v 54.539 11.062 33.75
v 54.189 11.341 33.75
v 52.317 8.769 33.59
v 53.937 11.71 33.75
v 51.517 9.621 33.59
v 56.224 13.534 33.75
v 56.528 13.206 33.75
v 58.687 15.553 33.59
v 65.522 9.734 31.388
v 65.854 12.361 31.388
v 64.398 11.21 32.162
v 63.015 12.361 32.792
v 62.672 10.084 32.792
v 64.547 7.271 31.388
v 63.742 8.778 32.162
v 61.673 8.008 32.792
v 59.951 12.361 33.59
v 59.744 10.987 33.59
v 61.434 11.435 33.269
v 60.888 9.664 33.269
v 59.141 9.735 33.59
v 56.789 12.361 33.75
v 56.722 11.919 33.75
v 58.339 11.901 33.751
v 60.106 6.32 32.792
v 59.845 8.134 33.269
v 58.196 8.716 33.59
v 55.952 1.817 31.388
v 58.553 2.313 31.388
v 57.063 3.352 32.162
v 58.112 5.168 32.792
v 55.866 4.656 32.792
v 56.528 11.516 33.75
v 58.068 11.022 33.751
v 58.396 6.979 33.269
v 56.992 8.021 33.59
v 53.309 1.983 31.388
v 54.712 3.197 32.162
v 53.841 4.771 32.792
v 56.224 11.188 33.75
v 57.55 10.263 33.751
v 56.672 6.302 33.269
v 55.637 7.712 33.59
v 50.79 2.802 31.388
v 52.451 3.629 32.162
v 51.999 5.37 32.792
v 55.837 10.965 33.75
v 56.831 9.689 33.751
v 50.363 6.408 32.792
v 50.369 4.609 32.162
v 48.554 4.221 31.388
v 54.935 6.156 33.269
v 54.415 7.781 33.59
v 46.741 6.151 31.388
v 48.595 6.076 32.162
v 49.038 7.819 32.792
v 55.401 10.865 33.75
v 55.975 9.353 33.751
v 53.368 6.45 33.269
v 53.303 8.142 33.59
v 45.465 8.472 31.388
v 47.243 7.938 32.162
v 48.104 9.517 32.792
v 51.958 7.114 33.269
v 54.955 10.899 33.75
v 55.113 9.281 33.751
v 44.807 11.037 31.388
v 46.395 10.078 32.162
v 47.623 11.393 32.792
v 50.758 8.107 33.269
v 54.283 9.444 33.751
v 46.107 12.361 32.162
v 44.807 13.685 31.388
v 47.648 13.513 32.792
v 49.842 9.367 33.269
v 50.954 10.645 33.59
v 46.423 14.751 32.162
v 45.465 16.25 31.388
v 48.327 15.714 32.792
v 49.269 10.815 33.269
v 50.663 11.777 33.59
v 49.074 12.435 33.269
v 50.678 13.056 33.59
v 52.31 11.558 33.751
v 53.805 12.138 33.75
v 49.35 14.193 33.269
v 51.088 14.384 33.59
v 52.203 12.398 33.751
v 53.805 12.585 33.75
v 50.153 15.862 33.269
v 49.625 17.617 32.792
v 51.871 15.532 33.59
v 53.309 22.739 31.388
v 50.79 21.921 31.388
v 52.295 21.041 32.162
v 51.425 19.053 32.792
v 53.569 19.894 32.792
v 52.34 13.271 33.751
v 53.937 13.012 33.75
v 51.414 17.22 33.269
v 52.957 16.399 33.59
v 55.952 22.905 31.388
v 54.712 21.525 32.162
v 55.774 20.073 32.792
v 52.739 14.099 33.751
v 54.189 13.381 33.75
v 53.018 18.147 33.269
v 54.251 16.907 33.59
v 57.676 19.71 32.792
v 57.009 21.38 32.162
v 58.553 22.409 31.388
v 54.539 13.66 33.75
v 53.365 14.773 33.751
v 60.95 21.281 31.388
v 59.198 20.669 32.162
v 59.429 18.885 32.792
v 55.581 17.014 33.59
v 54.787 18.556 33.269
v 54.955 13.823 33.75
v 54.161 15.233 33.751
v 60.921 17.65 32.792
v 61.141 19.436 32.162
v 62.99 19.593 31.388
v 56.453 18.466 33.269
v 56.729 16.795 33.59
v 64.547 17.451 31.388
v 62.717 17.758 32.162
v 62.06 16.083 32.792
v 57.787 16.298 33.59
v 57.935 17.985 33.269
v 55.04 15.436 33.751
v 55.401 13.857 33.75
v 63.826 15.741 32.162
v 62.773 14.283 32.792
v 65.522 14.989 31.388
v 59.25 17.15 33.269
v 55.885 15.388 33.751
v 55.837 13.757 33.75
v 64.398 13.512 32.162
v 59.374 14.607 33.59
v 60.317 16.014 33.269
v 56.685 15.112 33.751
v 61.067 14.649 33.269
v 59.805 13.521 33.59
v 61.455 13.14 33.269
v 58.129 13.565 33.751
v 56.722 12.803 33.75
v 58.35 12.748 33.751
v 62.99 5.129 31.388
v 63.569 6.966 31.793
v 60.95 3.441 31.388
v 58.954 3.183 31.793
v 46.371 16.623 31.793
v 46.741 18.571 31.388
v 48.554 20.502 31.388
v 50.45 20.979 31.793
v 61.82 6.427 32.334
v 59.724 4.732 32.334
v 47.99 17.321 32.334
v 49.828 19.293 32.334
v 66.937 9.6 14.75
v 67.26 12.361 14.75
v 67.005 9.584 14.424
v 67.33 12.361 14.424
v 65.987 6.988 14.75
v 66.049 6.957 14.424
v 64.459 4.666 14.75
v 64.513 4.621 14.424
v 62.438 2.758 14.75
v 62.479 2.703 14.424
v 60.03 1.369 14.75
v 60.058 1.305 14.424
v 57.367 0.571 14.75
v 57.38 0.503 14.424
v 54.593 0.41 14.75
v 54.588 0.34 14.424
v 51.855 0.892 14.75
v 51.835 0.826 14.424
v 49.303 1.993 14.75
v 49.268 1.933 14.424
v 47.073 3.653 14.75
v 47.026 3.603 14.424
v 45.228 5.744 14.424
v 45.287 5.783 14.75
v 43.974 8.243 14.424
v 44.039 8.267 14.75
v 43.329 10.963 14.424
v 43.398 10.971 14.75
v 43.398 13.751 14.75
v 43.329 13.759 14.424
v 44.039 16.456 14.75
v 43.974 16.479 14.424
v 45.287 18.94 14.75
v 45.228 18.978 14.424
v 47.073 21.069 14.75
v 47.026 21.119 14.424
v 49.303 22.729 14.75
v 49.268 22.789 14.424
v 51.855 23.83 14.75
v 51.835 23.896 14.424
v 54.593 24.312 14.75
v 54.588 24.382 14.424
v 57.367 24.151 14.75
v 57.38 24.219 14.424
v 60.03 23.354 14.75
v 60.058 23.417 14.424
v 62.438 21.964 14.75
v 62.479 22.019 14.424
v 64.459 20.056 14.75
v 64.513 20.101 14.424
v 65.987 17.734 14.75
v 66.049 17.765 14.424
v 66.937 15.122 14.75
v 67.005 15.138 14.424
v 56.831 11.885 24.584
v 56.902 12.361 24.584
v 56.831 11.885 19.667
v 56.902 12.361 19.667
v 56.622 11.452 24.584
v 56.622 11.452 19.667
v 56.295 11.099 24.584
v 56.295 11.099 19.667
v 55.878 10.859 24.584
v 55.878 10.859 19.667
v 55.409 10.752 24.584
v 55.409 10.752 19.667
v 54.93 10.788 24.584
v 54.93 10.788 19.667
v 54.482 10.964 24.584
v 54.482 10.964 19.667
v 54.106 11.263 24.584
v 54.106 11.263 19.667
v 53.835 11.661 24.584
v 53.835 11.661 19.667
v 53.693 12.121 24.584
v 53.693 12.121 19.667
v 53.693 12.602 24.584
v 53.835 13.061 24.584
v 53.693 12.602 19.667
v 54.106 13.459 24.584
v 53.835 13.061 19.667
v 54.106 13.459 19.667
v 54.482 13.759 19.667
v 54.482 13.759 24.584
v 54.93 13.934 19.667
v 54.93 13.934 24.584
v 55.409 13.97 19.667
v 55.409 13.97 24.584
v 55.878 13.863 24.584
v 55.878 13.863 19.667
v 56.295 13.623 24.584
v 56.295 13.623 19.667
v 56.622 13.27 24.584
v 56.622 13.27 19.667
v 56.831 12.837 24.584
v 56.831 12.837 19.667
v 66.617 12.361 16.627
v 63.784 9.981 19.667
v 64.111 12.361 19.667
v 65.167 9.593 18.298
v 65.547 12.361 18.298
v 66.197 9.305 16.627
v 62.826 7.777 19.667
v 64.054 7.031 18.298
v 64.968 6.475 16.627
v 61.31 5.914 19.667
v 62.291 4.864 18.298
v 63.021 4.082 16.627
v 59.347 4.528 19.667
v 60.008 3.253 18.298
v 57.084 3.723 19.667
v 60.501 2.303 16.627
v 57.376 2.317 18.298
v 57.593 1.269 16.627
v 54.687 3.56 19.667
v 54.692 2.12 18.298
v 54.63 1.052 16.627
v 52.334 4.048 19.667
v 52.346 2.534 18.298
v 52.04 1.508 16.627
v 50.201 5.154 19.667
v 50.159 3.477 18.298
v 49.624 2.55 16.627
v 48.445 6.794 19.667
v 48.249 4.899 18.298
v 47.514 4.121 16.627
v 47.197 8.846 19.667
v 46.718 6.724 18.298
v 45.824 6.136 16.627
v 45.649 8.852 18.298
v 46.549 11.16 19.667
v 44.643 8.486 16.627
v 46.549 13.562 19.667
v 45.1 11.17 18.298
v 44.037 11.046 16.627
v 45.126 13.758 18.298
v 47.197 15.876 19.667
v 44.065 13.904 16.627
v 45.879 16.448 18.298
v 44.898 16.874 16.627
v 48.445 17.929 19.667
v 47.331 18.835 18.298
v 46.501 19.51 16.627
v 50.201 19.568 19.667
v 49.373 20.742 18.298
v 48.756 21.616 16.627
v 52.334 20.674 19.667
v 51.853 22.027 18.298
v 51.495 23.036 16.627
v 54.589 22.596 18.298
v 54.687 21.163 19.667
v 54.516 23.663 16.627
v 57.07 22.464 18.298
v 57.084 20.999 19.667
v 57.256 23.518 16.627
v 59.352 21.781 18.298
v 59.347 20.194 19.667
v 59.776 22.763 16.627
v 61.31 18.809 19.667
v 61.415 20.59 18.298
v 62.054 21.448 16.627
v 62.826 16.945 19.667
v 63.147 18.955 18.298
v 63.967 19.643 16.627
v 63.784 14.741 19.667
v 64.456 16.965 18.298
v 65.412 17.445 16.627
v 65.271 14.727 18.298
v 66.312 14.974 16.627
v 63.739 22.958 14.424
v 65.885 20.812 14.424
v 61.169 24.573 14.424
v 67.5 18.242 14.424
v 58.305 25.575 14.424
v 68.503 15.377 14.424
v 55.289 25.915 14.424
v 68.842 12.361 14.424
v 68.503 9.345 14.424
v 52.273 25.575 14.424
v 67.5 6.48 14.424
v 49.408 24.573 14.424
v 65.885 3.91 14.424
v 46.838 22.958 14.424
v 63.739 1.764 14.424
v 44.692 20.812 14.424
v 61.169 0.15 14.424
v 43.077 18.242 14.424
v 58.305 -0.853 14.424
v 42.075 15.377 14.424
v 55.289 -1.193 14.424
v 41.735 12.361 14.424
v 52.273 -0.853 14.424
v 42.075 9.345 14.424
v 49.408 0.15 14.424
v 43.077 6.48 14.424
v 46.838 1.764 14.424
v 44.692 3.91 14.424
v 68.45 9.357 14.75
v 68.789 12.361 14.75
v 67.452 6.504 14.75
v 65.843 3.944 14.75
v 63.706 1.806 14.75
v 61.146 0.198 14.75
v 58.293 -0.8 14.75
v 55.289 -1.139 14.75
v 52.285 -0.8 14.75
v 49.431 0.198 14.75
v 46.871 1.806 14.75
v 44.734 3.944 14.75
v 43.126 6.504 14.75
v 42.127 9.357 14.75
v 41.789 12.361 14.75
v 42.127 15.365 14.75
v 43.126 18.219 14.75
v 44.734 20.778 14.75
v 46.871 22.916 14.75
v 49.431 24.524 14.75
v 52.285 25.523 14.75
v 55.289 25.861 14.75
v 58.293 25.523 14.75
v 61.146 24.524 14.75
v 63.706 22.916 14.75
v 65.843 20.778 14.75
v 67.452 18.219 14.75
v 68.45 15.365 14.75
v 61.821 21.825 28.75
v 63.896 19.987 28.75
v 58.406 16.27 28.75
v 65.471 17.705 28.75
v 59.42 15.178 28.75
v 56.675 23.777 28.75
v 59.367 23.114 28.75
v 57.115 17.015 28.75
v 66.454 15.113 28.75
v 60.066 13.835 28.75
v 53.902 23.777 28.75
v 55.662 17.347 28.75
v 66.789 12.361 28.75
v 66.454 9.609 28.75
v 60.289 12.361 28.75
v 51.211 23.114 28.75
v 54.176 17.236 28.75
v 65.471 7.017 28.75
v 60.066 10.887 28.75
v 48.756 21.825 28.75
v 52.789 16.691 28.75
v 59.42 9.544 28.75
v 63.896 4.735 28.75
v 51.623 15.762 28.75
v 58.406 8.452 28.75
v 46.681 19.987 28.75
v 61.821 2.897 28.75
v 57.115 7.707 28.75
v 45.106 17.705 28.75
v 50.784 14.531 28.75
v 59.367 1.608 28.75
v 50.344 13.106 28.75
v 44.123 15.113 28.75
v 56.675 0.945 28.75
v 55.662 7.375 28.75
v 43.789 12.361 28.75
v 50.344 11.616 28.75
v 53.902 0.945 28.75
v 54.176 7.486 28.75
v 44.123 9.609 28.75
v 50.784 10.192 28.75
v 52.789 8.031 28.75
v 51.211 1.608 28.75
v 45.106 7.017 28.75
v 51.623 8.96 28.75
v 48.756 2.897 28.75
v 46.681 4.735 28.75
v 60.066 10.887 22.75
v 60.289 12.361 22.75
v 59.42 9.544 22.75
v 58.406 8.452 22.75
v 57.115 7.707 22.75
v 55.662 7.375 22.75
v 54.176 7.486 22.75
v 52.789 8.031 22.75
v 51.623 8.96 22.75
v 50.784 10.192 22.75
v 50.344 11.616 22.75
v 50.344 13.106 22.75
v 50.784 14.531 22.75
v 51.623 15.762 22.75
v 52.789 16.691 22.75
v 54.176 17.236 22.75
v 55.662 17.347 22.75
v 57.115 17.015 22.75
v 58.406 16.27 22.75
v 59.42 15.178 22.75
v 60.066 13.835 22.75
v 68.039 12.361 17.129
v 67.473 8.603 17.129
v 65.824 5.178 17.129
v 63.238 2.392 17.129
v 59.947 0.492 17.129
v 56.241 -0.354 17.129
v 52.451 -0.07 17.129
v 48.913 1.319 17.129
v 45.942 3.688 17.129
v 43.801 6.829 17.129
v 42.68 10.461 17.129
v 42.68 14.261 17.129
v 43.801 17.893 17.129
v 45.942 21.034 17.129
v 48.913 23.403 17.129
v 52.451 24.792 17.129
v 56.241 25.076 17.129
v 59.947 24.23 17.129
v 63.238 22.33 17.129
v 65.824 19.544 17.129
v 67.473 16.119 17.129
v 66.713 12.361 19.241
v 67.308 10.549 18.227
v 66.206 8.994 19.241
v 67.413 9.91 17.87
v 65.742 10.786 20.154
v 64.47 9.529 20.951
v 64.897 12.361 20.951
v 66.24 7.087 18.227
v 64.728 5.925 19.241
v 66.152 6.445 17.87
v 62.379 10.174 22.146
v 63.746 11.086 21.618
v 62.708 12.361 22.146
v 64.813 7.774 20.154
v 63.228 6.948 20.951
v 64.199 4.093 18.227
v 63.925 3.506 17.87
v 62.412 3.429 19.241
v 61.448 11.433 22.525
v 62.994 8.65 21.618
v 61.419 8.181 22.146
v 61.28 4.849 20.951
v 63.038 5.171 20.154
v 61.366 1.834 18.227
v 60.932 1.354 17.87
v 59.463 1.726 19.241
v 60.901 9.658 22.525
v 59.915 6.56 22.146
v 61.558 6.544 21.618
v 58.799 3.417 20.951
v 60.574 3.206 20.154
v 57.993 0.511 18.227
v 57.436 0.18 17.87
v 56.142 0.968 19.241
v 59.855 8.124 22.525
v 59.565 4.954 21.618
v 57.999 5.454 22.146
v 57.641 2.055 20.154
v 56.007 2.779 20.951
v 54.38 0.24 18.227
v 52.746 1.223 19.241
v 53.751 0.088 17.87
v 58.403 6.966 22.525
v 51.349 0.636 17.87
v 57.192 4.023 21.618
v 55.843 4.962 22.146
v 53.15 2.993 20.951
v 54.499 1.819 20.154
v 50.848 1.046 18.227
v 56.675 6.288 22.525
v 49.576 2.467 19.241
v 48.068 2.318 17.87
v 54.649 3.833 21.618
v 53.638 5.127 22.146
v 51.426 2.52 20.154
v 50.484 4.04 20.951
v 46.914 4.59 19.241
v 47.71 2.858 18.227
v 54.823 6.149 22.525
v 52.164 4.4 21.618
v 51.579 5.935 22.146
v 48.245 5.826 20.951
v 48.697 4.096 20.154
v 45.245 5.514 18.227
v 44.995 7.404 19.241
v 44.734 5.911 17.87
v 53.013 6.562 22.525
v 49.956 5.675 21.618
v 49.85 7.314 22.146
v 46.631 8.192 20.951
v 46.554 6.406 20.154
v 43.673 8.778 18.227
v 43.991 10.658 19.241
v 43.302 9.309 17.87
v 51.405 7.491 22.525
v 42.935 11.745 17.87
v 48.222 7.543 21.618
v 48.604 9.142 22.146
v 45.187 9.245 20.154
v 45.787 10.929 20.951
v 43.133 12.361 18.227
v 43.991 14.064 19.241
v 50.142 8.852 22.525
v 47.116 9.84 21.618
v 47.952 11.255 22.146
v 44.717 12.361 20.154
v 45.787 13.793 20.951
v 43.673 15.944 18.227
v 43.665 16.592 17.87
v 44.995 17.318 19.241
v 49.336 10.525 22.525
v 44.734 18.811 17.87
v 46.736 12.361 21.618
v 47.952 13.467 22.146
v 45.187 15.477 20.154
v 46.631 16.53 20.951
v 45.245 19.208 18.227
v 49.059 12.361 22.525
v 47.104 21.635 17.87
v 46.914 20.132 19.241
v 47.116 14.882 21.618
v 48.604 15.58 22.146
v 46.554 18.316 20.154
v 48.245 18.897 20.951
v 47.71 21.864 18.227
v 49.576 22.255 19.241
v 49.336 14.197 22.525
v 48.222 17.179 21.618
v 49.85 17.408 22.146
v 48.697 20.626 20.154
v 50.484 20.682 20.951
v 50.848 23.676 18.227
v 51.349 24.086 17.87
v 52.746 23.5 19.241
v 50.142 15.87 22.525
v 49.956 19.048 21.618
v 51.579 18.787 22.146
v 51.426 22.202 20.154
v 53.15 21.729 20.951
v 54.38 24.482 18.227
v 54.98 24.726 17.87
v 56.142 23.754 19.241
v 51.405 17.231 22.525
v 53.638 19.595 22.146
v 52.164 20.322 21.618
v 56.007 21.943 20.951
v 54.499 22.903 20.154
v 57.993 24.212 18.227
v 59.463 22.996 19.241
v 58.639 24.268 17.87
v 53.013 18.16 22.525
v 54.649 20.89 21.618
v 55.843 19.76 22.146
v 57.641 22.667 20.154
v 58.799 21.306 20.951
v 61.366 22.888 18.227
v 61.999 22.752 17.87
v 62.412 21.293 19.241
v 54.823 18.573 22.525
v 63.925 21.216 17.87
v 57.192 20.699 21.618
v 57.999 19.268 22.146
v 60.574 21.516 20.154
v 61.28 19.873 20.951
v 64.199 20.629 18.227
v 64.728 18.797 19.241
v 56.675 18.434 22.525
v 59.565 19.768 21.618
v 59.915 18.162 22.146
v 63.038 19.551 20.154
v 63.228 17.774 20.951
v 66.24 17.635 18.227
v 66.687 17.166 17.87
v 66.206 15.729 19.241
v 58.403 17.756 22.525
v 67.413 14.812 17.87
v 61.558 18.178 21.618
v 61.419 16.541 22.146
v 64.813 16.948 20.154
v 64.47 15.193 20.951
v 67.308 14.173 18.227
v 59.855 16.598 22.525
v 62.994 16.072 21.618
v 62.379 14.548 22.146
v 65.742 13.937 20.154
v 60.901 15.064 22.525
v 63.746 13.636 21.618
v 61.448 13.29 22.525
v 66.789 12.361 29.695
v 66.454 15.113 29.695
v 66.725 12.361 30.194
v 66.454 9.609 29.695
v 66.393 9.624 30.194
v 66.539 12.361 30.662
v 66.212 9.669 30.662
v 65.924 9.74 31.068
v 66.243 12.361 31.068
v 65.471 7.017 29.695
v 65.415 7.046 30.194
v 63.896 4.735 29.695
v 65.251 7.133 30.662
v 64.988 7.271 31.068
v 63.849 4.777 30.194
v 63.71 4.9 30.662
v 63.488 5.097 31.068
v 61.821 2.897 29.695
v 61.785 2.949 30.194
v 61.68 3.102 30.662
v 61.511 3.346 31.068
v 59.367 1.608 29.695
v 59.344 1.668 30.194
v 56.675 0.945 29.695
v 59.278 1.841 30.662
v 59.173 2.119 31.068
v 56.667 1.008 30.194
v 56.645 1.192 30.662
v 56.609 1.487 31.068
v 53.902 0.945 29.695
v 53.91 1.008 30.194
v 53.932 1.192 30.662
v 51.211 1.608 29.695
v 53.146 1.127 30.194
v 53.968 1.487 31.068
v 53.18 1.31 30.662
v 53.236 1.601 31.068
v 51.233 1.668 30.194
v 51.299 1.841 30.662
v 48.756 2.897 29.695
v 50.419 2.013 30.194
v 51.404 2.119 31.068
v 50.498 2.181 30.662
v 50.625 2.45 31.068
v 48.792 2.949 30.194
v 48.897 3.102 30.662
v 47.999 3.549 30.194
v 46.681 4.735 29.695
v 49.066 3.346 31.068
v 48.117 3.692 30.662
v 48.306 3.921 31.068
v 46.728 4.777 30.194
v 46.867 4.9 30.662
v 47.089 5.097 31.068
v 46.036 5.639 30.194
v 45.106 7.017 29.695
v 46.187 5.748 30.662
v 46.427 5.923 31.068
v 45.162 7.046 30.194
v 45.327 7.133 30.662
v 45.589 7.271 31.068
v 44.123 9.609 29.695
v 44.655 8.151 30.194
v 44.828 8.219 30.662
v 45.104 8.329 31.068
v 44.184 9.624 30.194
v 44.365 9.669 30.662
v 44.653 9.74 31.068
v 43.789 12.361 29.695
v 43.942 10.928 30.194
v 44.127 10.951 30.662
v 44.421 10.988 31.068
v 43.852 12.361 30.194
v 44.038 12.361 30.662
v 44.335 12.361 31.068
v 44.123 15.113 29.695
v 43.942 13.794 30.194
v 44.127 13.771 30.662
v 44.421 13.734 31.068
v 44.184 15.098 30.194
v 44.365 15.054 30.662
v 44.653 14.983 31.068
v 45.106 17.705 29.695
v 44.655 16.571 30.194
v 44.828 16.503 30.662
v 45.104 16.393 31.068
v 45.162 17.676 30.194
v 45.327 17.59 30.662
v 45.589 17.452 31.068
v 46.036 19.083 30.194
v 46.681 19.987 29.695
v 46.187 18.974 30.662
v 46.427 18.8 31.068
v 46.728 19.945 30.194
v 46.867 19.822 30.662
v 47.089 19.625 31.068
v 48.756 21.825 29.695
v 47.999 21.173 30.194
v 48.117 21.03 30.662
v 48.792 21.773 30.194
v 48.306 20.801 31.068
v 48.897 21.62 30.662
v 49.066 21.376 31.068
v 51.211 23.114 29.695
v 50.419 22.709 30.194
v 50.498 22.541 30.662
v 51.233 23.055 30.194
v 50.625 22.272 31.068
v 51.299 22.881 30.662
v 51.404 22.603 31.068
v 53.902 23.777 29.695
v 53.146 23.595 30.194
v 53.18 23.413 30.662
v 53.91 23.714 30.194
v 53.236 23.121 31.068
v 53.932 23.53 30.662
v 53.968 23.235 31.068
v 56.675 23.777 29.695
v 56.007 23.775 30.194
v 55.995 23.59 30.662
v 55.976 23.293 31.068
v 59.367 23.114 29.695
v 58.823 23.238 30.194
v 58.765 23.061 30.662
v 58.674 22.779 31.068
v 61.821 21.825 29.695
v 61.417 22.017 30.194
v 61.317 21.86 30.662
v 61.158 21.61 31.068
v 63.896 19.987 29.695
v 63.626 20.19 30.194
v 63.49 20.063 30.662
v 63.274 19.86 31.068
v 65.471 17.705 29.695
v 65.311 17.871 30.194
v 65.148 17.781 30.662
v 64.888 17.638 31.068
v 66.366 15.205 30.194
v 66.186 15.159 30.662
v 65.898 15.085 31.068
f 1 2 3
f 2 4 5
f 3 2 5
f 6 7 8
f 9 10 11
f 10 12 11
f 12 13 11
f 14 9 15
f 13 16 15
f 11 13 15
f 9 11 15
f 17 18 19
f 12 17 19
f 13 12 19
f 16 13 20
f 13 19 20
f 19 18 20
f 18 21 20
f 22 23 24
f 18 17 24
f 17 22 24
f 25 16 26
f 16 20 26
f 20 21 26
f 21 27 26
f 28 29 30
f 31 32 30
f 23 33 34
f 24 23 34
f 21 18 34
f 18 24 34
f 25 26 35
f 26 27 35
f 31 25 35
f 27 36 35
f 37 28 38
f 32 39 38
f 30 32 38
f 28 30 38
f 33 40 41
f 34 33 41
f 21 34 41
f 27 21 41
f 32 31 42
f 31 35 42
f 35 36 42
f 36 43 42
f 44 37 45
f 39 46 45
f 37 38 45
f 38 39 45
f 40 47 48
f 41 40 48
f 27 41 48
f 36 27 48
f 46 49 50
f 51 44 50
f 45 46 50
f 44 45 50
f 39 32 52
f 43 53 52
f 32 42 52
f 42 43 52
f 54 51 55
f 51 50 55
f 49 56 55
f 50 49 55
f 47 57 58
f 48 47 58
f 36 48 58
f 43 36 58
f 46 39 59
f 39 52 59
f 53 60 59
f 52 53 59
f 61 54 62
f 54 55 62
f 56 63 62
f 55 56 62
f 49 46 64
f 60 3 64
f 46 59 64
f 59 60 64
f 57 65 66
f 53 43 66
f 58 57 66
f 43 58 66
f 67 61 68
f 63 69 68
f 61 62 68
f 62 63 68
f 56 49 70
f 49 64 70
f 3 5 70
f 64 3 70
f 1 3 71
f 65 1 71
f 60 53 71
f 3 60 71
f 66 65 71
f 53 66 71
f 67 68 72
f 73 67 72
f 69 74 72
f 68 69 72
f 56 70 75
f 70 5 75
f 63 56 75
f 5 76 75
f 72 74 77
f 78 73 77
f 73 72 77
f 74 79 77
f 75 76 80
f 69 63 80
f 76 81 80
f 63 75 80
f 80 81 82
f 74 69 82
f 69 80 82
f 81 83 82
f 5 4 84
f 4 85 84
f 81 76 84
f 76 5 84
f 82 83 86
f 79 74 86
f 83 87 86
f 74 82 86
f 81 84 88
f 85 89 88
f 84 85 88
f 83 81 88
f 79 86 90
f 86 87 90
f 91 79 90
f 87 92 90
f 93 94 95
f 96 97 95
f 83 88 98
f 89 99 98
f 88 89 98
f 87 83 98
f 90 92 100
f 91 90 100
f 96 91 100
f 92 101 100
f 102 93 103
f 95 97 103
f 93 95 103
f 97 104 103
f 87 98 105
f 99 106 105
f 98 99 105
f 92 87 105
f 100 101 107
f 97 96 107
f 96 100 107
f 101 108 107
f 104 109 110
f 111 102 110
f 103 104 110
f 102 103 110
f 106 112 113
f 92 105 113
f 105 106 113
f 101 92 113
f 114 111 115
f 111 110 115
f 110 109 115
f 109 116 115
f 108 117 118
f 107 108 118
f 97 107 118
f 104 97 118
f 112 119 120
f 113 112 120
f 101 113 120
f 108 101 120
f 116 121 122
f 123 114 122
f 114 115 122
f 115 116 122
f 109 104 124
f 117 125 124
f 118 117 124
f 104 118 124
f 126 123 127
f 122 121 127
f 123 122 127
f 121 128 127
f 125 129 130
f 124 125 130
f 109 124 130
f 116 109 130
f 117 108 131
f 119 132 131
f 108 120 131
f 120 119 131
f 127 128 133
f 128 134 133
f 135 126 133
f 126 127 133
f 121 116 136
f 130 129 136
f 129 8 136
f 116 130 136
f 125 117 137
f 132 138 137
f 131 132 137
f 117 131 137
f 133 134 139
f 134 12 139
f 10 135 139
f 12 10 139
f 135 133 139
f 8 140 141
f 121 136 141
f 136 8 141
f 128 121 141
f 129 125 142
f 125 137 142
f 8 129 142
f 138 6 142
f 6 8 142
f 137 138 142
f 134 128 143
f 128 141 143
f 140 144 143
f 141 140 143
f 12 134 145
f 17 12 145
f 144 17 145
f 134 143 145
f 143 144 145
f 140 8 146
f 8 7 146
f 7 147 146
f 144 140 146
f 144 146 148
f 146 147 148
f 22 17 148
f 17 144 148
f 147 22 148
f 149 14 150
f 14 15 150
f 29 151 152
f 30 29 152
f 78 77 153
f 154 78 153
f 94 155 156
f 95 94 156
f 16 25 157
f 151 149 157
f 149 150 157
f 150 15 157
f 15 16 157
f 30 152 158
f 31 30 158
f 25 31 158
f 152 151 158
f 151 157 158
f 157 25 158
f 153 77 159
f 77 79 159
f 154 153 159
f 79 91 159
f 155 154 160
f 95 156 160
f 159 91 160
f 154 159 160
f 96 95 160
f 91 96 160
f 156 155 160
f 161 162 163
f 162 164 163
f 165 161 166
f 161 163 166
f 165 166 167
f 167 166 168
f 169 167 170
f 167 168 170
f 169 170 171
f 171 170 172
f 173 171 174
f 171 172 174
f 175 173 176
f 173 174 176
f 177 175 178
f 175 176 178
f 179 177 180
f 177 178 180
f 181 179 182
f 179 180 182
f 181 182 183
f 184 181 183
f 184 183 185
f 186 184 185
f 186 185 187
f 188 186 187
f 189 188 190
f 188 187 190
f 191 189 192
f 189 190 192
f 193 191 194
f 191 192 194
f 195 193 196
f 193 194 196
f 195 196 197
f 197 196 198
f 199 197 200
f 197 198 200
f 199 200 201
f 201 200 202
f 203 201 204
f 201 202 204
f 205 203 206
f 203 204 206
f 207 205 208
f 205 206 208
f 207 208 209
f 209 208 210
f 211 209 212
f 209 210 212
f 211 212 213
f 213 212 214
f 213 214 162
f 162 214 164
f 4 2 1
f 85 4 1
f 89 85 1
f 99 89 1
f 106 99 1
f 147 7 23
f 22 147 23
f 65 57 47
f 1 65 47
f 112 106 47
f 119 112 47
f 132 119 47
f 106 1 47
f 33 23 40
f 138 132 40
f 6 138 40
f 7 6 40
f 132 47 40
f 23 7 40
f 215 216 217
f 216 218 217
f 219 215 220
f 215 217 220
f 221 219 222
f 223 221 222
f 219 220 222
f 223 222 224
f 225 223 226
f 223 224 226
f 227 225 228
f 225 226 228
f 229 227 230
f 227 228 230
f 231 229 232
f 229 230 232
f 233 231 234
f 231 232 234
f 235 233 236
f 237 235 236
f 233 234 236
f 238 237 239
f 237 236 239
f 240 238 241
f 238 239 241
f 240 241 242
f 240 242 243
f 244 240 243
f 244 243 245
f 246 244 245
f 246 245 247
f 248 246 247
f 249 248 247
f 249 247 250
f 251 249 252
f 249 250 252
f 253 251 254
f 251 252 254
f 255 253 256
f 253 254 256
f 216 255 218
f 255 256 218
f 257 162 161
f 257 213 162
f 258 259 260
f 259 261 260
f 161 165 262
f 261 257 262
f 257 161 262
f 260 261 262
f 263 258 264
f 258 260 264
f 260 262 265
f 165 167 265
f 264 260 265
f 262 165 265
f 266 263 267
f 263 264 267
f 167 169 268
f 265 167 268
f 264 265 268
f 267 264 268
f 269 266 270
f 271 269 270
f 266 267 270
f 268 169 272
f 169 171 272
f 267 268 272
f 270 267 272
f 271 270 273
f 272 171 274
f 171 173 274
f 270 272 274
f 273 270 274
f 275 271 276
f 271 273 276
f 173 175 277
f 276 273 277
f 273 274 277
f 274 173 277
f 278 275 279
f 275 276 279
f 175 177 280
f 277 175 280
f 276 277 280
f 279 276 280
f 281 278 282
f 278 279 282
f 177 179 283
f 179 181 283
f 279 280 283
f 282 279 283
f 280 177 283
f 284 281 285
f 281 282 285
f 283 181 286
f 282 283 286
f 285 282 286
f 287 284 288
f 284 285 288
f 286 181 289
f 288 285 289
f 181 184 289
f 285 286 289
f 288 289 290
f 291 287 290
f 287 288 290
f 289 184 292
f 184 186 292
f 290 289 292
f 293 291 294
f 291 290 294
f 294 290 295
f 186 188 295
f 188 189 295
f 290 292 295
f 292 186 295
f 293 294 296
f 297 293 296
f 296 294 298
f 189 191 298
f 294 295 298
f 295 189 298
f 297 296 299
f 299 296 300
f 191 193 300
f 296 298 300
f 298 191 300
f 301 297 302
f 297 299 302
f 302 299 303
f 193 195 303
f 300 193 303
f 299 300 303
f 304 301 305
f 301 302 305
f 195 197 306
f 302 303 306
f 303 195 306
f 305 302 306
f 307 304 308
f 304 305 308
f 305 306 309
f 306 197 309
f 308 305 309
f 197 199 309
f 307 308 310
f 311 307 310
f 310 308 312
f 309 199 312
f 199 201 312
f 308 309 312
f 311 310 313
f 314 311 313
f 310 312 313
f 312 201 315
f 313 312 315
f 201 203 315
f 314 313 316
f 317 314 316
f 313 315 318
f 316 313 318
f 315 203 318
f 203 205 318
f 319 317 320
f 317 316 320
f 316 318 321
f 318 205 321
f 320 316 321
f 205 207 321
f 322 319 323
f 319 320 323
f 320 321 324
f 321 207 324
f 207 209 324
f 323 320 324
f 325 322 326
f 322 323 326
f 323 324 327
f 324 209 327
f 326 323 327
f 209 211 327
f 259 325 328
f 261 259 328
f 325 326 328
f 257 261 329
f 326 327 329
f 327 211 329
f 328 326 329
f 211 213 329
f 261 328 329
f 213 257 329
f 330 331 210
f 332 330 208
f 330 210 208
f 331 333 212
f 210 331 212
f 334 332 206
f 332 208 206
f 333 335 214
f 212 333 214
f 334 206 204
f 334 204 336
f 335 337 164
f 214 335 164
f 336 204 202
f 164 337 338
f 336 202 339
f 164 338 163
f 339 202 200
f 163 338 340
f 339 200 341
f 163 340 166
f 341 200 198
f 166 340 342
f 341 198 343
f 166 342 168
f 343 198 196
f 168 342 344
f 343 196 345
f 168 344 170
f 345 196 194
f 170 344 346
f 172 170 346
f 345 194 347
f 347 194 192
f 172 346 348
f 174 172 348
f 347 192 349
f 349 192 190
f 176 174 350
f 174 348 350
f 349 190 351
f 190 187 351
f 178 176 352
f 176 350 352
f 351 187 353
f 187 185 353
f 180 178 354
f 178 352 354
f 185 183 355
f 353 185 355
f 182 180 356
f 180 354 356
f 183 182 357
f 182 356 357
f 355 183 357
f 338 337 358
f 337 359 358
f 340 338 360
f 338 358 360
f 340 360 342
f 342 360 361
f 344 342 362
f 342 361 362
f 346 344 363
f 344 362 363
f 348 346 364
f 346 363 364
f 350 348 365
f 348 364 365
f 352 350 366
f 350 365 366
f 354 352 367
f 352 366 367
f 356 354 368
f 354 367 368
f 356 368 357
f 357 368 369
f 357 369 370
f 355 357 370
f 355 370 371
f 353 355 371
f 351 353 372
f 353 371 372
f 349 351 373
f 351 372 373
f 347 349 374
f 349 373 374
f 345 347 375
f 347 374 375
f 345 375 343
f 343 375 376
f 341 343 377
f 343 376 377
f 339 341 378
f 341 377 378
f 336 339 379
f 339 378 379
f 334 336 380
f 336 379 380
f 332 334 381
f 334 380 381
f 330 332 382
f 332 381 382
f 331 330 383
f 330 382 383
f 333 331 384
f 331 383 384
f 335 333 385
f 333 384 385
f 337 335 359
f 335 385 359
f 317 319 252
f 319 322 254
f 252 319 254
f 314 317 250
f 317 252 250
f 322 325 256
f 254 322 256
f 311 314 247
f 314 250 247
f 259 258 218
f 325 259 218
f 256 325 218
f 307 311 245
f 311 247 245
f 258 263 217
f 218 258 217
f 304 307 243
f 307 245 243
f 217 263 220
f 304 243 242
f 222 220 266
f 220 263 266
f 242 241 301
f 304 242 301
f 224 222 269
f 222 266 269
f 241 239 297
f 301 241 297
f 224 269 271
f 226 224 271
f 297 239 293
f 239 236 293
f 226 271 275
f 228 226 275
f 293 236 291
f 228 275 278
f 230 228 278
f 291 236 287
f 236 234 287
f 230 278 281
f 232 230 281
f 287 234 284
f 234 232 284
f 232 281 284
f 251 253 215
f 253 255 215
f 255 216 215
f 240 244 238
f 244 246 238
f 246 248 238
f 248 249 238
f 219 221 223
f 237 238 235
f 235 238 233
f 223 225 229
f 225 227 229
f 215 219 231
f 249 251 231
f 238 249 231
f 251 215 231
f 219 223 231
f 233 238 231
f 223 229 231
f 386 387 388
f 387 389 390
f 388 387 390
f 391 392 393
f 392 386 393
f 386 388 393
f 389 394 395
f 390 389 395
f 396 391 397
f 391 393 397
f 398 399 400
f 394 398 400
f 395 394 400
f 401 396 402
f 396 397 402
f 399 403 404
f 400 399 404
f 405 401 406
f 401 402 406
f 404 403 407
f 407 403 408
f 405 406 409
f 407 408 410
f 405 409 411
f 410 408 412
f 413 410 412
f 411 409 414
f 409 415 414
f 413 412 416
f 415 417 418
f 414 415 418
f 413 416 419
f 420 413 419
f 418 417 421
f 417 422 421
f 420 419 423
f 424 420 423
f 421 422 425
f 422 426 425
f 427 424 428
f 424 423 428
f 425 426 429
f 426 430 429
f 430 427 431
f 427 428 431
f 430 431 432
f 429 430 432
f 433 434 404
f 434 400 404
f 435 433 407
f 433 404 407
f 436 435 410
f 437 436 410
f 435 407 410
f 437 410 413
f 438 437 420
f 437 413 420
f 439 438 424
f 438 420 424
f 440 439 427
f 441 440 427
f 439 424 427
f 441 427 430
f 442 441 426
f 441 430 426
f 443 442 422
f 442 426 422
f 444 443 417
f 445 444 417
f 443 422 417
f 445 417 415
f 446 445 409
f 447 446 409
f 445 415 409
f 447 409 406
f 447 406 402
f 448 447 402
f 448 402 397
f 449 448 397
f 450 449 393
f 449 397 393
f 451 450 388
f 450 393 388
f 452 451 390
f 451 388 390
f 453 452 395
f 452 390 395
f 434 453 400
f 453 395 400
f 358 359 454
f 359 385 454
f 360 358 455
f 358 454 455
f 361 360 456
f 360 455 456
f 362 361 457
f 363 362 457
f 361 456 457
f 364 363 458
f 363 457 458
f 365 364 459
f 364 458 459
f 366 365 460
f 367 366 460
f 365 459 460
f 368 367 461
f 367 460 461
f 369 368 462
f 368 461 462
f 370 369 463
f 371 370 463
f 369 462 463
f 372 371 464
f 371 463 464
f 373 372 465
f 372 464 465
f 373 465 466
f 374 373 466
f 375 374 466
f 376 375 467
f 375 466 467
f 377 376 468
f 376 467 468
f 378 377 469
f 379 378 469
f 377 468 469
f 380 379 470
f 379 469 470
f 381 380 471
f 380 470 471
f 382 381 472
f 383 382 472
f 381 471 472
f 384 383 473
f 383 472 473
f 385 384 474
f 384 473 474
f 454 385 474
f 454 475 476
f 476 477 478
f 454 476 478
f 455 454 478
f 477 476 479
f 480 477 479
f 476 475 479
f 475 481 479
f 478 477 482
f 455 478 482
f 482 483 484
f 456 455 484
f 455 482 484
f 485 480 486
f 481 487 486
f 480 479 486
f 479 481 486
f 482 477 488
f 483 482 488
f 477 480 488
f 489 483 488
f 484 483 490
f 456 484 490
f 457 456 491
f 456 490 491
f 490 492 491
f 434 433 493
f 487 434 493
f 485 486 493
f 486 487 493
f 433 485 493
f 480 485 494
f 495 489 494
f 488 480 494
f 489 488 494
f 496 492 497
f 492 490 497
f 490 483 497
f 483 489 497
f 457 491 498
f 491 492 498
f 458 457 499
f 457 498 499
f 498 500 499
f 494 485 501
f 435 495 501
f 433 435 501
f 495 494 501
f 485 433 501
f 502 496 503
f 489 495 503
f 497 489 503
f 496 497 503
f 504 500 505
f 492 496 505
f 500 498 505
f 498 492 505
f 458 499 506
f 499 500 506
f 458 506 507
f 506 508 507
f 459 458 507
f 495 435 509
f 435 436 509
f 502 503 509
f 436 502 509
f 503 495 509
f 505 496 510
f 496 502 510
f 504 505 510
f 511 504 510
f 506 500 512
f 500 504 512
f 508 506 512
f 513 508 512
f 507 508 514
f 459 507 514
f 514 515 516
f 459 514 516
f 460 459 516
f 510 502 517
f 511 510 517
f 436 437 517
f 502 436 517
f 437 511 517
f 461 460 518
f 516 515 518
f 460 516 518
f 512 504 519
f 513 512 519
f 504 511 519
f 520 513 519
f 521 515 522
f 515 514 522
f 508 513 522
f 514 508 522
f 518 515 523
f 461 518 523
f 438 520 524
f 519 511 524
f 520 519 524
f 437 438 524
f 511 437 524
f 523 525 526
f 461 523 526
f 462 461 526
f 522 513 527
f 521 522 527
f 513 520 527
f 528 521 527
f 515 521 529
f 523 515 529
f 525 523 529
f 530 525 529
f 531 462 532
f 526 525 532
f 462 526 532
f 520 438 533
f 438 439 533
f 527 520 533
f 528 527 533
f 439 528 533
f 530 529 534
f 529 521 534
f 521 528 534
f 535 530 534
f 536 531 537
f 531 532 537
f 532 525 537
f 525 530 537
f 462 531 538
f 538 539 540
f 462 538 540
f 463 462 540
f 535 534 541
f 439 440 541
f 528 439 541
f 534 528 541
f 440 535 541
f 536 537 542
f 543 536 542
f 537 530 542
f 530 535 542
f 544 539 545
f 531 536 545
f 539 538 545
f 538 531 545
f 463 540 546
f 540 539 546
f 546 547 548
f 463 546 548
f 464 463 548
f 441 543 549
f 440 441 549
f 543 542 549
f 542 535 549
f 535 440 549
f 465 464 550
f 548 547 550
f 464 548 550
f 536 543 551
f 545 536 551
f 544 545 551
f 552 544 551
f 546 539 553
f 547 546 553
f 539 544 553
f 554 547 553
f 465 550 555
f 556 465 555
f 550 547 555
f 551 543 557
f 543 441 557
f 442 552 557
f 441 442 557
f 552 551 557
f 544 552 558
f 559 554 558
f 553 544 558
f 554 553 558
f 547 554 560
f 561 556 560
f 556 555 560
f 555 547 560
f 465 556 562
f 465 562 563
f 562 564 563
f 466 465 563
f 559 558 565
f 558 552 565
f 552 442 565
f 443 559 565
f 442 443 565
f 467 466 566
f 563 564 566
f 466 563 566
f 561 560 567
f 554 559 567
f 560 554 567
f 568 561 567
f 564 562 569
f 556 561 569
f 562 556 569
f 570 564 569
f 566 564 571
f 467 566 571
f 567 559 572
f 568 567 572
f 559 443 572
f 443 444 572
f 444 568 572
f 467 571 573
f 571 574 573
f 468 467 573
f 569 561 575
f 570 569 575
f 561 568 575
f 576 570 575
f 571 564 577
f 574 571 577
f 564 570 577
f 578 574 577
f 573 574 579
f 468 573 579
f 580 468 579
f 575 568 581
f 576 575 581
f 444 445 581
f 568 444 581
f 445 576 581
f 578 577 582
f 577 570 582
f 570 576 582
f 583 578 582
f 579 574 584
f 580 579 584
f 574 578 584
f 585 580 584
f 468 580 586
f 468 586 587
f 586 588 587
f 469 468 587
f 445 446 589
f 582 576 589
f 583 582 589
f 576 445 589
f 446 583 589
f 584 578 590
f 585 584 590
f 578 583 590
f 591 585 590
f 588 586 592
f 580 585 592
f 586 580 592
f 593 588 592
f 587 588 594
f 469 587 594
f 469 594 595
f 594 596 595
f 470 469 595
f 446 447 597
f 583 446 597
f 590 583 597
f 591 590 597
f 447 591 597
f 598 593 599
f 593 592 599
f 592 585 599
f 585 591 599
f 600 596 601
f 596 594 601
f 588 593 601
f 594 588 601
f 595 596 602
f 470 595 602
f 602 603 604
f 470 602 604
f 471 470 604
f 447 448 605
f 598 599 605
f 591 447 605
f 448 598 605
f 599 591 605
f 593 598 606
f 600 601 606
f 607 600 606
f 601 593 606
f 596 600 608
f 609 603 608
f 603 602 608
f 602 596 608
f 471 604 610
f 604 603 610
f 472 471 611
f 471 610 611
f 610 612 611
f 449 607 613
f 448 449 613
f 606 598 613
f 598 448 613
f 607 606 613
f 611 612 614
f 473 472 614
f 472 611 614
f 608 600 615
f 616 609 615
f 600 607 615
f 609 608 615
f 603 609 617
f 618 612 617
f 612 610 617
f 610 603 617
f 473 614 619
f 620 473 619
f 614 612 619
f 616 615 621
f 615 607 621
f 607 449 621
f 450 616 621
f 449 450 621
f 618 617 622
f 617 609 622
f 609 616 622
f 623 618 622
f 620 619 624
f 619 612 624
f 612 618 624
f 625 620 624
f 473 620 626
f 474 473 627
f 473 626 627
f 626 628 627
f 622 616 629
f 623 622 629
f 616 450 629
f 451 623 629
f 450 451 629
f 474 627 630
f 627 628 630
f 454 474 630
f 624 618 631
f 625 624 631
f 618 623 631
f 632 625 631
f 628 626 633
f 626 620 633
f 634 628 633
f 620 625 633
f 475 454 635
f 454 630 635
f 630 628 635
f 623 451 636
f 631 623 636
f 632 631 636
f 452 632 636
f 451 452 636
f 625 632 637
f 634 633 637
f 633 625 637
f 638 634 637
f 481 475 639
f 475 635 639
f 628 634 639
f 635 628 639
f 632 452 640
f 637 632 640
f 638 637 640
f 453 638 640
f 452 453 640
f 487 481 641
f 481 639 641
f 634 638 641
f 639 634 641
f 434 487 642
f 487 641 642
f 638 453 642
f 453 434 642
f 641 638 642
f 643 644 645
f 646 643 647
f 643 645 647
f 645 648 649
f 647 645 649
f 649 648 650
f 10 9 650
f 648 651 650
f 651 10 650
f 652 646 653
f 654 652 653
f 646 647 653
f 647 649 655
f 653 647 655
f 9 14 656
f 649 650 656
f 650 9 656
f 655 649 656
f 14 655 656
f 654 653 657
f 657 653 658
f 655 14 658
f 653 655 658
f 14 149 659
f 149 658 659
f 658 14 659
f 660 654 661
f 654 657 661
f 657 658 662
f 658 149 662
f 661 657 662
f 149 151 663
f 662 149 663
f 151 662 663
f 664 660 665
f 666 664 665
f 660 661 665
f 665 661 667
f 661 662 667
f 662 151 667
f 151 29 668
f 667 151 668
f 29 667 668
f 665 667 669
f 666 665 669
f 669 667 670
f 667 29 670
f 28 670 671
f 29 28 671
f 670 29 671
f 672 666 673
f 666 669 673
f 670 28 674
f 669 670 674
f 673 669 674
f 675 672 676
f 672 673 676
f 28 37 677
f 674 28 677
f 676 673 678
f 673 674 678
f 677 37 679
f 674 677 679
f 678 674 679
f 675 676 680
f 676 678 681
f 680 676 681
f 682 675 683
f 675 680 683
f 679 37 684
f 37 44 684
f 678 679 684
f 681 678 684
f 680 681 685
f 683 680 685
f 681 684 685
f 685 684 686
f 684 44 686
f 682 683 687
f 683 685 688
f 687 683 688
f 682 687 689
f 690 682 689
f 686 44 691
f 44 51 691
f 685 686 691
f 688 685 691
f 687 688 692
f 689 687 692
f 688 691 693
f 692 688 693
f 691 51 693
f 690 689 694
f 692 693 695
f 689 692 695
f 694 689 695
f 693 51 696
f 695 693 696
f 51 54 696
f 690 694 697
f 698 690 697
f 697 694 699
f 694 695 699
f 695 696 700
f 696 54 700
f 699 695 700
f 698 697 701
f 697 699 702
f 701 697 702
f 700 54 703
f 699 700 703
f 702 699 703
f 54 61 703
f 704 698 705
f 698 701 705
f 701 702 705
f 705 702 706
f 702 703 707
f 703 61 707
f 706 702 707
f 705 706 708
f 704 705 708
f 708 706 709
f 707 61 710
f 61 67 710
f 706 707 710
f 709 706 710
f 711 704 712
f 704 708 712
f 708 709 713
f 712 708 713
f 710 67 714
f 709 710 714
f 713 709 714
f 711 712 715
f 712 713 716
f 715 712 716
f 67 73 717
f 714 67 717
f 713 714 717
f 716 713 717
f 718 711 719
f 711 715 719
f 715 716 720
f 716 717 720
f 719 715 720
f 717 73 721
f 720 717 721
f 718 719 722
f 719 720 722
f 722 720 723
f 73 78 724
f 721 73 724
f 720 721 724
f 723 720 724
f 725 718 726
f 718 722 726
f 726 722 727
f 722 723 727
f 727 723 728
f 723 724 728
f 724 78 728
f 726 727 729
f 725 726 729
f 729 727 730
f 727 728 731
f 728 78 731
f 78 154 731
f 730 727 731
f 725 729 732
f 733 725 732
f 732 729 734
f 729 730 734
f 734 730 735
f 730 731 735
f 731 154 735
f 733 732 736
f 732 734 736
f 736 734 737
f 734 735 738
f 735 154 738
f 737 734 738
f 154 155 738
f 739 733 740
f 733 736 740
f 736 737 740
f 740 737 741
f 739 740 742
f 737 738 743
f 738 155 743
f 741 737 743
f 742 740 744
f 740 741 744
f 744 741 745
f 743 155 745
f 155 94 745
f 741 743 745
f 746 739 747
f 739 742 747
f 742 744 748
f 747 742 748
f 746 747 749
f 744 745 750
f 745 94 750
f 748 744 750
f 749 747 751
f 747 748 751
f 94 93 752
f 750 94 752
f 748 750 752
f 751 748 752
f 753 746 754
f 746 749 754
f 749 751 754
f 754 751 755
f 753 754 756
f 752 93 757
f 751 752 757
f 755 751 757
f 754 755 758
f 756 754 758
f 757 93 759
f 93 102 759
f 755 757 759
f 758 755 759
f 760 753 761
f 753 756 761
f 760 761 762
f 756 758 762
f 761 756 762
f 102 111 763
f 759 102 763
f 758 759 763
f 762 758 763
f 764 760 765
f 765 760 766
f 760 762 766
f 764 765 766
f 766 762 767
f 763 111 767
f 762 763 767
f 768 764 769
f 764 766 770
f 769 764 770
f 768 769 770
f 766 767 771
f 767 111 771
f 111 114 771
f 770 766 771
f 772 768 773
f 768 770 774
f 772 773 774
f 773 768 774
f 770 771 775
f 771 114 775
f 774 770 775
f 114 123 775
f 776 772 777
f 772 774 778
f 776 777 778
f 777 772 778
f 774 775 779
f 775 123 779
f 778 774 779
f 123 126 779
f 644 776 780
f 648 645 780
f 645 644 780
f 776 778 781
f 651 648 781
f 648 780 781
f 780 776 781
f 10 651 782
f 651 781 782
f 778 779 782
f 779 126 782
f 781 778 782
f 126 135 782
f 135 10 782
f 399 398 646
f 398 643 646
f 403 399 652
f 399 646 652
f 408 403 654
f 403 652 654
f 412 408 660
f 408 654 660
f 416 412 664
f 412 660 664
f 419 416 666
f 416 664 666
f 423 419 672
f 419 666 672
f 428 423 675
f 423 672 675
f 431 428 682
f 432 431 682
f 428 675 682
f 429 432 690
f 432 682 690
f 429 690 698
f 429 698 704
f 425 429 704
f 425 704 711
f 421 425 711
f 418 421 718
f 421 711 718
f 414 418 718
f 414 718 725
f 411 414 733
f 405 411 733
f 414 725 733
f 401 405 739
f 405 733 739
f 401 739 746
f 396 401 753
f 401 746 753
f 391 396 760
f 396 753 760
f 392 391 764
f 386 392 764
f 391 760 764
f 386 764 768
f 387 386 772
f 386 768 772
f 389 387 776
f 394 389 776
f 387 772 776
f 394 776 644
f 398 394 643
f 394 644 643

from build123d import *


with BuildPart() as part:
    # 스케치1 → 회전1 (revolve)
    with BuildSketch(Plane.XZ.offset(-12.361086828)):
        with BuildLine():
            Line((56.788605182, 33.75), (55.288605182, 33.75))
            Line((55.288605182, 33.75), (55.288605182, 24.584215849))
            Line((55.288605182, 24.584215849), (56.902385075, 24.584215849))
            Line((56.902385075, 24.584215849), (56.902385075, 19.667107924))
            Line((56.902385075, 19.667107924), (64.110728948, 19.667107924))
            ThreePointArc((64.110728948, 19.667107924), (66.132282487, 17.494751384), (67.260179418, 14.75))
            Line((67.260179418, 14.75), (67.329630852, 14.424330444))
            Line((67.329630852, 14.424330444), (68.842352891, 14.424330444))
            Line((68.842352891, 14.424330444), (68.788605182, 14.75))
            ThreePointArc((68.788605182, 14.75), (65.860000911, 20.153982961), (60.288605182, 22.75))
            Line((60.288605182, 22.75), (60.288605182, 28.75))
            Line((60.288605182, 28.75), (66.788605182, 28.75))
            Line((66.788605182, 28.75), (66.788605182, 29.69501927))
            ThreePointArc((66.788605182, 29.69501927), (66.539331768, 30.661950717), (65.853648759, 31.387851861))
            ThreePointArc((65.853648759, 31.387851861), (61.503658583, 33.269414183), (56.788605182, 33.75))
        make_face()
    revolve(axis=Axis((55.288605182, 12.361086828, 33.770778283), (0, 0, -1)))


solid = part.part
